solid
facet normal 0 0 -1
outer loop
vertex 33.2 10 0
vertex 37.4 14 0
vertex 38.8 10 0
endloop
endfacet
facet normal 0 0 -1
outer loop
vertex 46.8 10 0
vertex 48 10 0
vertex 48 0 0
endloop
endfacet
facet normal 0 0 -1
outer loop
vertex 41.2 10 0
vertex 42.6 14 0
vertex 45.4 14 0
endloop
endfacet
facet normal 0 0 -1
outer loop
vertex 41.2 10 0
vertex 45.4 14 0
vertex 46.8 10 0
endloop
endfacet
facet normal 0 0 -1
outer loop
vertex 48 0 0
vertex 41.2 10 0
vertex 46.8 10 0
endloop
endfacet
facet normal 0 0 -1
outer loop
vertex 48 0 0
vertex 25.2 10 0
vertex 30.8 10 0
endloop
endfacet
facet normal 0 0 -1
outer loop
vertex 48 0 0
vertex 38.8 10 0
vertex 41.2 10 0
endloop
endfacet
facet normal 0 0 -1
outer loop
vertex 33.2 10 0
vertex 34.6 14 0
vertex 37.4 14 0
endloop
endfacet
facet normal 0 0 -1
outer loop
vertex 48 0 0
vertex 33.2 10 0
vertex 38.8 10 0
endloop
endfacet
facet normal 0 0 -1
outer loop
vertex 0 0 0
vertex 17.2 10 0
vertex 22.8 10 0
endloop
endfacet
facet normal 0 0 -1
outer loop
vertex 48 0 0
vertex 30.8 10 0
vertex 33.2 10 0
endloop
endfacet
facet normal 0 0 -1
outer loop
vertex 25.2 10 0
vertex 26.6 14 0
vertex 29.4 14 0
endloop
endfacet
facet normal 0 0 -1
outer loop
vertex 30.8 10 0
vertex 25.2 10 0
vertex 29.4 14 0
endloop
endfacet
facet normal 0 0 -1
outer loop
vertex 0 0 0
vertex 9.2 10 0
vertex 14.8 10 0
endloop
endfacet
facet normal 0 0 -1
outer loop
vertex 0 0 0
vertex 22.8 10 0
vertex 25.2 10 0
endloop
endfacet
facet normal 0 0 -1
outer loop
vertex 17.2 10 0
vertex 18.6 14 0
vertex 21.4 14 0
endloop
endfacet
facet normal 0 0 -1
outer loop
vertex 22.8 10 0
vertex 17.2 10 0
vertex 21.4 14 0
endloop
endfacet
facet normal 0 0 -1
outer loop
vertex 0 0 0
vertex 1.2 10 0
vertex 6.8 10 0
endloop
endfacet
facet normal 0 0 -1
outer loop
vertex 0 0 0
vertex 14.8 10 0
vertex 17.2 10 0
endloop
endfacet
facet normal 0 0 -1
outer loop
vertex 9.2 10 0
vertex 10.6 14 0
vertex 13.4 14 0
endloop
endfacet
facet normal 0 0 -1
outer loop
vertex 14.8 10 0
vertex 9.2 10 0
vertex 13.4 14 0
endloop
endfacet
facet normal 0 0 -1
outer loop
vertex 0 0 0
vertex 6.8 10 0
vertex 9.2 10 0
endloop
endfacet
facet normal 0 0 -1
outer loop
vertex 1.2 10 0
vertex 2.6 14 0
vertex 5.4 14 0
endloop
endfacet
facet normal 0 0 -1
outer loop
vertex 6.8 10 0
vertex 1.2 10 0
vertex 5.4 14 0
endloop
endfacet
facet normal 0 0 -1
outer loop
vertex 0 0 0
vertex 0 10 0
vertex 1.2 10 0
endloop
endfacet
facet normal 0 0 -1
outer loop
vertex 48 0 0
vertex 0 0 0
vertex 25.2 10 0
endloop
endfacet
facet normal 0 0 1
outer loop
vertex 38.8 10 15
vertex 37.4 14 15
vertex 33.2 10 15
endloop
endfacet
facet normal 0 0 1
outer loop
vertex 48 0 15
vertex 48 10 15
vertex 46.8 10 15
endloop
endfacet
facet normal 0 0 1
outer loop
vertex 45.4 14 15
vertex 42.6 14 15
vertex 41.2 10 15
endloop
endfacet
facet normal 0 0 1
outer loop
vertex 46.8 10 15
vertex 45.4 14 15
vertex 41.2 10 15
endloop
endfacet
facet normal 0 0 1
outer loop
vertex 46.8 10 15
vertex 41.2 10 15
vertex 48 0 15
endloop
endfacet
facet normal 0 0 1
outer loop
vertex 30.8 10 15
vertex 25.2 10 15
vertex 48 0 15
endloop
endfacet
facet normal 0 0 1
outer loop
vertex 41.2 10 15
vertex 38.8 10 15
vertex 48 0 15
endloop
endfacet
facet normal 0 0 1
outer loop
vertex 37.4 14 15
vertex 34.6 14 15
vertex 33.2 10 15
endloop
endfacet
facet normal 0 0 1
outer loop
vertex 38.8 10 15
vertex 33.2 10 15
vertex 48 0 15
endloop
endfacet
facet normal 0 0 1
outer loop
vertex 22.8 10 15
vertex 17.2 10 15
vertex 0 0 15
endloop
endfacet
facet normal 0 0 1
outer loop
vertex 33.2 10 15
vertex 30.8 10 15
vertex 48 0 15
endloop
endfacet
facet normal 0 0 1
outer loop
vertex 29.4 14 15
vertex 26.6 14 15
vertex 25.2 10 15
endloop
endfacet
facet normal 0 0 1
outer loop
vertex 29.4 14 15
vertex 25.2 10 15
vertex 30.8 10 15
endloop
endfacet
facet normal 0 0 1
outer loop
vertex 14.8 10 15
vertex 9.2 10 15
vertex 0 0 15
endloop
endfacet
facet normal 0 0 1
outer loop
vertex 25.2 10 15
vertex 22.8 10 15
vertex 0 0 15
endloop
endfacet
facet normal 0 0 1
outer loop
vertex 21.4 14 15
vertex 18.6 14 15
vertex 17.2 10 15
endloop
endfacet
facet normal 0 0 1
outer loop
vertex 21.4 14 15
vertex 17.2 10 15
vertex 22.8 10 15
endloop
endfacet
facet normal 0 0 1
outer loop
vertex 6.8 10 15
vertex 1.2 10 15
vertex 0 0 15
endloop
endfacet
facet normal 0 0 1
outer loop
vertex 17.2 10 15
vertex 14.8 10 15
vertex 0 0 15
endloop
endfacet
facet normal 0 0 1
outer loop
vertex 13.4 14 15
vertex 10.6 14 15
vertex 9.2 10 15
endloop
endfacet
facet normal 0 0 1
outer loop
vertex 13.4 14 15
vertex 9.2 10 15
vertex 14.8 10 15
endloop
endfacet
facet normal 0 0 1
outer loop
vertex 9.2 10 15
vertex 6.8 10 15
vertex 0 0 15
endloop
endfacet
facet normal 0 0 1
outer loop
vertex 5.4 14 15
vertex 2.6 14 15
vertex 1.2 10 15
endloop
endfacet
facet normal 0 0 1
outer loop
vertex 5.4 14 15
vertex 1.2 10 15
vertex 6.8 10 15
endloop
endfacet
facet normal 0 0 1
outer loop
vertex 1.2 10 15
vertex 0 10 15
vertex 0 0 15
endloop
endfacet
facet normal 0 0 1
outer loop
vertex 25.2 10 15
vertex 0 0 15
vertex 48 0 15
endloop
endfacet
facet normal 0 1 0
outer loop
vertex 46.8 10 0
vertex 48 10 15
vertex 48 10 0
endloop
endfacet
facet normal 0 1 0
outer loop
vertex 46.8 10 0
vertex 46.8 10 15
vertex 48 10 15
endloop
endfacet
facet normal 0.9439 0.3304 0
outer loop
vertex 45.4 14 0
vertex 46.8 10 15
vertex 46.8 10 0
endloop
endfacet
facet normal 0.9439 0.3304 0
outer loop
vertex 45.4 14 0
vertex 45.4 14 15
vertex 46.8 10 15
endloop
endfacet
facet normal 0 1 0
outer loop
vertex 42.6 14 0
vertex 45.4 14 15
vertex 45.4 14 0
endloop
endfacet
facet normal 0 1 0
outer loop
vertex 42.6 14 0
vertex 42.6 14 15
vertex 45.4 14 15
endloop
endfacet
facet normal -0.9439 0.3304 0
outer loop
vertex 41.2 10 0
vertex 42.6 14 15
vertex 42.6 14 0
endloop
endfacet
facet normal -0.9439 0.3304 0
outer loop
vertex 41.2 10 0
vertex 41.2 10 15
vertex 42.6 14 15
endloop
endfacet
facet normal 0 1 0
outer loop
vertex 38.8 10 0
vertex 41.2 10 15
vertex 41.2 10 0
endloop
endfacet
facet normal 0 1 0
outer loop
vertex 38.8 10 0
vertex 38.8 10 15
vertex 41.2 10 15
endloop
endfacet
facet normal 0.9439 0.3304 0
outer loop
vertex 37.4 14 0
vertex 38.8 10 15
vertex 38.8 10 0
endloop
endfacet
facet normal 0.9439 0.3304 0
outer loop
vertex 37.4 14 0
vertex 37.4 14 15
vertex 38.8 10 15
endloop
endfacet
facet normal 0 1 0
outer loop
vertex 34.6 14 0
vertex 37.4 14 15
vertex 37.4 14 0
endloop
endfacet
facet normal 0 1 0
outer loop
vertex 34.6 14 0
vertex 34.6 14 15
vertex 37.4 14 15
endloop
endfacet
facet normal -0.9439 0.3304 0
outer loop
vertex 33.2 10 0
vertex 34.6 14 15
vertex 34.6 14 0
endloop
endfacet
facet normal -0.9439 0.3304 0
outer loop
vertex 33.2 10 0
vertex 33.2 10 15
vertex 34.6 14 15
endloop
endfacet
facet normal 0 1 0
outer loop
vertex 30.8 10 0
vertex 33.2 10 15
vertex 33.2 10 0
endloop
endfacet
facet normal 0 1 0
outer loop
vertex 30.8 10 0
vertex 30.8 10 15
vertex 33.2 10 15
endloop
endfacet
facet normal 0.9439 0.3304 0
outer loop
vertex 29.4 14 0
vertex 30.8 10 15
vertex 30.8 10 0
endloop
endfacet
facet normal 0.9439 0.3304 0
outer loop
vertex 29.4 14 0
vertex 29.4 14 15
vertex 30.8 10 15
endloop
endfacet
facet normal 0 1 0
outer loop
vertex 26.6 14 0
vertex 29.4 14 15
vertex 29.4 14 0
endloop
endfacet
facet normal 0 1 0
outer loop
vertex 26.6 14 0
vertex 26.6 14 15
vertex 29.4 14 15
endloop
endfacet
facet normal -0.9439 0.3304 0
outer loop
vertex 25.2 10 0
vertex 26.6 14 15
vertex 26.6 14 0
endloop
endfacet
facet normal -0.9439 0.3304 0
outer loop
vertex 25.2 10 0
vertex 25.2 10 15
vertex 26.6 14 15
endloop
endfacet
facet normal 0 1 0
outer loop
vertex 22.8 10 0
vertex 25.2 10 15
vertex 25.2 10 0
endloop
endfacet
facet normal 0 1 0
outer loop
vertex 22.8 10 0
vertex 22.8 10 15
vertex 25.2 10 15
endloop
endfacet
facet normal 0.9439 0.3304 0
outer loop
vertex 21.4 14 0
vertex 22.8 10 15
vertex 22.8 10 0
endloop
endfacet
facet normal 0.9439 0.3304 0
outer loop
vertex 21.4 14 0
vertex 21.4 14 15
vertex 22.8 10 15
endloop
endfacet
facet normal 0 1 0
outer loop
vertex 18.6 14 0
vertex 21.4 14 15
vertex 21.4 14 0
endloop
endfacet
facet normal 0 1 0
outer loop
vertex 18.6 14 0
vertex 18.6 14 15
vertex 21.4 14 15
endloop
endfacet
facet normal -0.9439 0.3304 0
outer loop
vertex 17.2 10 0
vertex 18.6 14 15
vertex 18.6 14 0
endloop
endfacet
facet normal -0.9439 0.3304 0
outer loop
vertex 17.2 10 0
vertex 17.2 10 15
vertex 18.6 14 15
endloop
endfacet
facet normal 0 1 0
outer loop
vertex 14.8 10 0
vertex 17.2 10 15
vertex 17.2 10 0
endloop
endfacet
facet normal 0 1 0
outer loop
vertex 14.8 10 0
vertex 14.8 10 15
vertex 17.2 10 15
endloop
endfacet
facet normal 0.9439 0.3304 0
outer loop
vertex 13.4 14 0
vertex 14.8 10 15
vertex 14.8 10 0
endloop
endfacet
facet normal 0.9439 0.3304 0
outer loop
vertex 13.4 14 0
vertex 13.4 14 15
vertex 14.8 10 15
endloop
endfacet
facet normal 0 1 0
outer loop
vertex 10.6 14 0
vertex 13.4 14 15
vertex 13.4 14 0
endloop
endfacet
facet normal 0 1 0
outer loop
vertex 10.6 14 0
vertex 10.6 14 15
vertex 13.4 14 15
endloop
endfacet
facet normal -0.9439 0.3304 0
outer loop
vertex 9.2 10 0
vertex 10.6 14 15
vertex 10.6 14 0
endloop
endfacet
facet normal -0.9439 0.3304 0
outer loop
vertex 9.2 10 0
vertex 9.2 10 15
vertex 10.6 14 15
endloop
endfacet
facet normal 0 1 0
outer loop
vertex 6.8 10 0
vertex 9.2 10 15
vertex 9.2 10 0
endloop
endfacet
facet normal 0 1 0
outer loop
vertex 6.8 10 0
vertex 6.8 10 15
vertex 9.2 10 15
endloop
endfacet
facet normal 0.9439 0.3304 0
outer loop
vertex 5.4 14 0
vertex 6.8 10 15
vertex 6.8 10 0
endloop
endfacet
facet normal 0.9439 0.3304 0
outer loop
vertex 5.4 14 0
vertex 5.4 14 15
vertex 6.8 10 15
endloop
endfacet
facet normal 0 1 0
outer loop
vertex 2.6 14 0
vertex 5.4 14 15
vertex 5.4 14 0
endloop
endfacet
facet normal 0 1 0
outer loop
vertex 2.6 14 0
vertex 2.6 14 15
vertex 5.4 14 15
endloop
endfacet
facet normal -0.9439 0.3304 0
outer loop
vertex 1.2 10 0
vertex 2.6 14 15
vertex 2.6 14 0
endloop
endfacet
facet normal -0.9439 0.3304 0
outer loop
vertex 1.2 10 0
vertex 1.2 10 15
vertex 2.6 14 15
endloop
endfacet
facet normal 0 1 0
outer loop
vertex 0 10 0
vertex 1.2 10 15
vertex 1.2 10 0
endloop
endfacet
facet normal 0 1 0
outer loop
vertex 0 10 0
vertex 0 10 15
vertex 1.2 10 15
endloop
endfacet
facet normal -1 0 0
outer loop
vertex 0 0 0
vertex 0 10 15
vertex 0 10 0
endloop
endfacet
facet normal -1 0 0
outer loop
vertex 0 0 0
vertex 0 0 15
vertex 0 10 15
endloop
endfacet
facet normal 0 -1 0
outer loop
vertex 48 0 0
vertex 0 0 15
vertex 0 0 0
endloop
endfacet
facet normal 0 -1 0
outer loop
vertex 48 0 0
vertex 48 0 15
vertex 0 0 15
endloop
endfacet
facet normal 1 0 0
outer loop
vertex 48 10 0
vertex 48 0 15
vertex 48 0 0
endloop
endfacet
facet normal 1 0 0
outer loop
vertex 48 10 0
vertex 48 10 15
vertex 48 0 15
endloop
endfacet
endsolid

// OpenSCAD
$fn = 32;

// ----------------------------------------------------------------------
// Gear rack: 6 teeth, pitch 8 mm
// ----------------------------------------------------------------------

// --- parameters (mm) ---
teeth = 6;                // number of teeth
pitch = 8;                // tooth pitch, X
root_w = 5.6;             // tooth width at the root
tip_w = 2.8;              // tooth width at the tip
base_h = 10;              // rack body height, Y
tooth_h = 4;              // tooth height above the body
plate_t = 15;             // rack width, Z (extrusion height)
fit_tol = 0.02;           // declared fit tolerance (prompt contract)
free_tol = 0.2;           // declared free tolerance (prompt contract)

rack_l = teeth * pitch;  // overall length
total_h = base_h + tooth_h;  // overall height

profile = [[0, 0], [48, 0], [48, 10], [46.8, 10], [45.4, 14], [42.6, 14], [41.2, 10], [38.8, 10], [37.4, 14], [34.6, 14], [33.2, 10], [30.8, 10], [29.4, 14], [26.6, 14], [25.2, 10], [22.8, 10], [21.4, 14], [18.6, 14], [17.2, 10], [14.8, 10], [13.4, 14], [10.6, 14], [9.2, 10], [6.8, 10], [5.4, 14], [2.6, 14], [1.2, 10], [0, 10]];  // primary outline, 28 points, counter clockwise

// --- the one profile operation ---
linear_extrude(height = plate_t) polygon(points = profile);
